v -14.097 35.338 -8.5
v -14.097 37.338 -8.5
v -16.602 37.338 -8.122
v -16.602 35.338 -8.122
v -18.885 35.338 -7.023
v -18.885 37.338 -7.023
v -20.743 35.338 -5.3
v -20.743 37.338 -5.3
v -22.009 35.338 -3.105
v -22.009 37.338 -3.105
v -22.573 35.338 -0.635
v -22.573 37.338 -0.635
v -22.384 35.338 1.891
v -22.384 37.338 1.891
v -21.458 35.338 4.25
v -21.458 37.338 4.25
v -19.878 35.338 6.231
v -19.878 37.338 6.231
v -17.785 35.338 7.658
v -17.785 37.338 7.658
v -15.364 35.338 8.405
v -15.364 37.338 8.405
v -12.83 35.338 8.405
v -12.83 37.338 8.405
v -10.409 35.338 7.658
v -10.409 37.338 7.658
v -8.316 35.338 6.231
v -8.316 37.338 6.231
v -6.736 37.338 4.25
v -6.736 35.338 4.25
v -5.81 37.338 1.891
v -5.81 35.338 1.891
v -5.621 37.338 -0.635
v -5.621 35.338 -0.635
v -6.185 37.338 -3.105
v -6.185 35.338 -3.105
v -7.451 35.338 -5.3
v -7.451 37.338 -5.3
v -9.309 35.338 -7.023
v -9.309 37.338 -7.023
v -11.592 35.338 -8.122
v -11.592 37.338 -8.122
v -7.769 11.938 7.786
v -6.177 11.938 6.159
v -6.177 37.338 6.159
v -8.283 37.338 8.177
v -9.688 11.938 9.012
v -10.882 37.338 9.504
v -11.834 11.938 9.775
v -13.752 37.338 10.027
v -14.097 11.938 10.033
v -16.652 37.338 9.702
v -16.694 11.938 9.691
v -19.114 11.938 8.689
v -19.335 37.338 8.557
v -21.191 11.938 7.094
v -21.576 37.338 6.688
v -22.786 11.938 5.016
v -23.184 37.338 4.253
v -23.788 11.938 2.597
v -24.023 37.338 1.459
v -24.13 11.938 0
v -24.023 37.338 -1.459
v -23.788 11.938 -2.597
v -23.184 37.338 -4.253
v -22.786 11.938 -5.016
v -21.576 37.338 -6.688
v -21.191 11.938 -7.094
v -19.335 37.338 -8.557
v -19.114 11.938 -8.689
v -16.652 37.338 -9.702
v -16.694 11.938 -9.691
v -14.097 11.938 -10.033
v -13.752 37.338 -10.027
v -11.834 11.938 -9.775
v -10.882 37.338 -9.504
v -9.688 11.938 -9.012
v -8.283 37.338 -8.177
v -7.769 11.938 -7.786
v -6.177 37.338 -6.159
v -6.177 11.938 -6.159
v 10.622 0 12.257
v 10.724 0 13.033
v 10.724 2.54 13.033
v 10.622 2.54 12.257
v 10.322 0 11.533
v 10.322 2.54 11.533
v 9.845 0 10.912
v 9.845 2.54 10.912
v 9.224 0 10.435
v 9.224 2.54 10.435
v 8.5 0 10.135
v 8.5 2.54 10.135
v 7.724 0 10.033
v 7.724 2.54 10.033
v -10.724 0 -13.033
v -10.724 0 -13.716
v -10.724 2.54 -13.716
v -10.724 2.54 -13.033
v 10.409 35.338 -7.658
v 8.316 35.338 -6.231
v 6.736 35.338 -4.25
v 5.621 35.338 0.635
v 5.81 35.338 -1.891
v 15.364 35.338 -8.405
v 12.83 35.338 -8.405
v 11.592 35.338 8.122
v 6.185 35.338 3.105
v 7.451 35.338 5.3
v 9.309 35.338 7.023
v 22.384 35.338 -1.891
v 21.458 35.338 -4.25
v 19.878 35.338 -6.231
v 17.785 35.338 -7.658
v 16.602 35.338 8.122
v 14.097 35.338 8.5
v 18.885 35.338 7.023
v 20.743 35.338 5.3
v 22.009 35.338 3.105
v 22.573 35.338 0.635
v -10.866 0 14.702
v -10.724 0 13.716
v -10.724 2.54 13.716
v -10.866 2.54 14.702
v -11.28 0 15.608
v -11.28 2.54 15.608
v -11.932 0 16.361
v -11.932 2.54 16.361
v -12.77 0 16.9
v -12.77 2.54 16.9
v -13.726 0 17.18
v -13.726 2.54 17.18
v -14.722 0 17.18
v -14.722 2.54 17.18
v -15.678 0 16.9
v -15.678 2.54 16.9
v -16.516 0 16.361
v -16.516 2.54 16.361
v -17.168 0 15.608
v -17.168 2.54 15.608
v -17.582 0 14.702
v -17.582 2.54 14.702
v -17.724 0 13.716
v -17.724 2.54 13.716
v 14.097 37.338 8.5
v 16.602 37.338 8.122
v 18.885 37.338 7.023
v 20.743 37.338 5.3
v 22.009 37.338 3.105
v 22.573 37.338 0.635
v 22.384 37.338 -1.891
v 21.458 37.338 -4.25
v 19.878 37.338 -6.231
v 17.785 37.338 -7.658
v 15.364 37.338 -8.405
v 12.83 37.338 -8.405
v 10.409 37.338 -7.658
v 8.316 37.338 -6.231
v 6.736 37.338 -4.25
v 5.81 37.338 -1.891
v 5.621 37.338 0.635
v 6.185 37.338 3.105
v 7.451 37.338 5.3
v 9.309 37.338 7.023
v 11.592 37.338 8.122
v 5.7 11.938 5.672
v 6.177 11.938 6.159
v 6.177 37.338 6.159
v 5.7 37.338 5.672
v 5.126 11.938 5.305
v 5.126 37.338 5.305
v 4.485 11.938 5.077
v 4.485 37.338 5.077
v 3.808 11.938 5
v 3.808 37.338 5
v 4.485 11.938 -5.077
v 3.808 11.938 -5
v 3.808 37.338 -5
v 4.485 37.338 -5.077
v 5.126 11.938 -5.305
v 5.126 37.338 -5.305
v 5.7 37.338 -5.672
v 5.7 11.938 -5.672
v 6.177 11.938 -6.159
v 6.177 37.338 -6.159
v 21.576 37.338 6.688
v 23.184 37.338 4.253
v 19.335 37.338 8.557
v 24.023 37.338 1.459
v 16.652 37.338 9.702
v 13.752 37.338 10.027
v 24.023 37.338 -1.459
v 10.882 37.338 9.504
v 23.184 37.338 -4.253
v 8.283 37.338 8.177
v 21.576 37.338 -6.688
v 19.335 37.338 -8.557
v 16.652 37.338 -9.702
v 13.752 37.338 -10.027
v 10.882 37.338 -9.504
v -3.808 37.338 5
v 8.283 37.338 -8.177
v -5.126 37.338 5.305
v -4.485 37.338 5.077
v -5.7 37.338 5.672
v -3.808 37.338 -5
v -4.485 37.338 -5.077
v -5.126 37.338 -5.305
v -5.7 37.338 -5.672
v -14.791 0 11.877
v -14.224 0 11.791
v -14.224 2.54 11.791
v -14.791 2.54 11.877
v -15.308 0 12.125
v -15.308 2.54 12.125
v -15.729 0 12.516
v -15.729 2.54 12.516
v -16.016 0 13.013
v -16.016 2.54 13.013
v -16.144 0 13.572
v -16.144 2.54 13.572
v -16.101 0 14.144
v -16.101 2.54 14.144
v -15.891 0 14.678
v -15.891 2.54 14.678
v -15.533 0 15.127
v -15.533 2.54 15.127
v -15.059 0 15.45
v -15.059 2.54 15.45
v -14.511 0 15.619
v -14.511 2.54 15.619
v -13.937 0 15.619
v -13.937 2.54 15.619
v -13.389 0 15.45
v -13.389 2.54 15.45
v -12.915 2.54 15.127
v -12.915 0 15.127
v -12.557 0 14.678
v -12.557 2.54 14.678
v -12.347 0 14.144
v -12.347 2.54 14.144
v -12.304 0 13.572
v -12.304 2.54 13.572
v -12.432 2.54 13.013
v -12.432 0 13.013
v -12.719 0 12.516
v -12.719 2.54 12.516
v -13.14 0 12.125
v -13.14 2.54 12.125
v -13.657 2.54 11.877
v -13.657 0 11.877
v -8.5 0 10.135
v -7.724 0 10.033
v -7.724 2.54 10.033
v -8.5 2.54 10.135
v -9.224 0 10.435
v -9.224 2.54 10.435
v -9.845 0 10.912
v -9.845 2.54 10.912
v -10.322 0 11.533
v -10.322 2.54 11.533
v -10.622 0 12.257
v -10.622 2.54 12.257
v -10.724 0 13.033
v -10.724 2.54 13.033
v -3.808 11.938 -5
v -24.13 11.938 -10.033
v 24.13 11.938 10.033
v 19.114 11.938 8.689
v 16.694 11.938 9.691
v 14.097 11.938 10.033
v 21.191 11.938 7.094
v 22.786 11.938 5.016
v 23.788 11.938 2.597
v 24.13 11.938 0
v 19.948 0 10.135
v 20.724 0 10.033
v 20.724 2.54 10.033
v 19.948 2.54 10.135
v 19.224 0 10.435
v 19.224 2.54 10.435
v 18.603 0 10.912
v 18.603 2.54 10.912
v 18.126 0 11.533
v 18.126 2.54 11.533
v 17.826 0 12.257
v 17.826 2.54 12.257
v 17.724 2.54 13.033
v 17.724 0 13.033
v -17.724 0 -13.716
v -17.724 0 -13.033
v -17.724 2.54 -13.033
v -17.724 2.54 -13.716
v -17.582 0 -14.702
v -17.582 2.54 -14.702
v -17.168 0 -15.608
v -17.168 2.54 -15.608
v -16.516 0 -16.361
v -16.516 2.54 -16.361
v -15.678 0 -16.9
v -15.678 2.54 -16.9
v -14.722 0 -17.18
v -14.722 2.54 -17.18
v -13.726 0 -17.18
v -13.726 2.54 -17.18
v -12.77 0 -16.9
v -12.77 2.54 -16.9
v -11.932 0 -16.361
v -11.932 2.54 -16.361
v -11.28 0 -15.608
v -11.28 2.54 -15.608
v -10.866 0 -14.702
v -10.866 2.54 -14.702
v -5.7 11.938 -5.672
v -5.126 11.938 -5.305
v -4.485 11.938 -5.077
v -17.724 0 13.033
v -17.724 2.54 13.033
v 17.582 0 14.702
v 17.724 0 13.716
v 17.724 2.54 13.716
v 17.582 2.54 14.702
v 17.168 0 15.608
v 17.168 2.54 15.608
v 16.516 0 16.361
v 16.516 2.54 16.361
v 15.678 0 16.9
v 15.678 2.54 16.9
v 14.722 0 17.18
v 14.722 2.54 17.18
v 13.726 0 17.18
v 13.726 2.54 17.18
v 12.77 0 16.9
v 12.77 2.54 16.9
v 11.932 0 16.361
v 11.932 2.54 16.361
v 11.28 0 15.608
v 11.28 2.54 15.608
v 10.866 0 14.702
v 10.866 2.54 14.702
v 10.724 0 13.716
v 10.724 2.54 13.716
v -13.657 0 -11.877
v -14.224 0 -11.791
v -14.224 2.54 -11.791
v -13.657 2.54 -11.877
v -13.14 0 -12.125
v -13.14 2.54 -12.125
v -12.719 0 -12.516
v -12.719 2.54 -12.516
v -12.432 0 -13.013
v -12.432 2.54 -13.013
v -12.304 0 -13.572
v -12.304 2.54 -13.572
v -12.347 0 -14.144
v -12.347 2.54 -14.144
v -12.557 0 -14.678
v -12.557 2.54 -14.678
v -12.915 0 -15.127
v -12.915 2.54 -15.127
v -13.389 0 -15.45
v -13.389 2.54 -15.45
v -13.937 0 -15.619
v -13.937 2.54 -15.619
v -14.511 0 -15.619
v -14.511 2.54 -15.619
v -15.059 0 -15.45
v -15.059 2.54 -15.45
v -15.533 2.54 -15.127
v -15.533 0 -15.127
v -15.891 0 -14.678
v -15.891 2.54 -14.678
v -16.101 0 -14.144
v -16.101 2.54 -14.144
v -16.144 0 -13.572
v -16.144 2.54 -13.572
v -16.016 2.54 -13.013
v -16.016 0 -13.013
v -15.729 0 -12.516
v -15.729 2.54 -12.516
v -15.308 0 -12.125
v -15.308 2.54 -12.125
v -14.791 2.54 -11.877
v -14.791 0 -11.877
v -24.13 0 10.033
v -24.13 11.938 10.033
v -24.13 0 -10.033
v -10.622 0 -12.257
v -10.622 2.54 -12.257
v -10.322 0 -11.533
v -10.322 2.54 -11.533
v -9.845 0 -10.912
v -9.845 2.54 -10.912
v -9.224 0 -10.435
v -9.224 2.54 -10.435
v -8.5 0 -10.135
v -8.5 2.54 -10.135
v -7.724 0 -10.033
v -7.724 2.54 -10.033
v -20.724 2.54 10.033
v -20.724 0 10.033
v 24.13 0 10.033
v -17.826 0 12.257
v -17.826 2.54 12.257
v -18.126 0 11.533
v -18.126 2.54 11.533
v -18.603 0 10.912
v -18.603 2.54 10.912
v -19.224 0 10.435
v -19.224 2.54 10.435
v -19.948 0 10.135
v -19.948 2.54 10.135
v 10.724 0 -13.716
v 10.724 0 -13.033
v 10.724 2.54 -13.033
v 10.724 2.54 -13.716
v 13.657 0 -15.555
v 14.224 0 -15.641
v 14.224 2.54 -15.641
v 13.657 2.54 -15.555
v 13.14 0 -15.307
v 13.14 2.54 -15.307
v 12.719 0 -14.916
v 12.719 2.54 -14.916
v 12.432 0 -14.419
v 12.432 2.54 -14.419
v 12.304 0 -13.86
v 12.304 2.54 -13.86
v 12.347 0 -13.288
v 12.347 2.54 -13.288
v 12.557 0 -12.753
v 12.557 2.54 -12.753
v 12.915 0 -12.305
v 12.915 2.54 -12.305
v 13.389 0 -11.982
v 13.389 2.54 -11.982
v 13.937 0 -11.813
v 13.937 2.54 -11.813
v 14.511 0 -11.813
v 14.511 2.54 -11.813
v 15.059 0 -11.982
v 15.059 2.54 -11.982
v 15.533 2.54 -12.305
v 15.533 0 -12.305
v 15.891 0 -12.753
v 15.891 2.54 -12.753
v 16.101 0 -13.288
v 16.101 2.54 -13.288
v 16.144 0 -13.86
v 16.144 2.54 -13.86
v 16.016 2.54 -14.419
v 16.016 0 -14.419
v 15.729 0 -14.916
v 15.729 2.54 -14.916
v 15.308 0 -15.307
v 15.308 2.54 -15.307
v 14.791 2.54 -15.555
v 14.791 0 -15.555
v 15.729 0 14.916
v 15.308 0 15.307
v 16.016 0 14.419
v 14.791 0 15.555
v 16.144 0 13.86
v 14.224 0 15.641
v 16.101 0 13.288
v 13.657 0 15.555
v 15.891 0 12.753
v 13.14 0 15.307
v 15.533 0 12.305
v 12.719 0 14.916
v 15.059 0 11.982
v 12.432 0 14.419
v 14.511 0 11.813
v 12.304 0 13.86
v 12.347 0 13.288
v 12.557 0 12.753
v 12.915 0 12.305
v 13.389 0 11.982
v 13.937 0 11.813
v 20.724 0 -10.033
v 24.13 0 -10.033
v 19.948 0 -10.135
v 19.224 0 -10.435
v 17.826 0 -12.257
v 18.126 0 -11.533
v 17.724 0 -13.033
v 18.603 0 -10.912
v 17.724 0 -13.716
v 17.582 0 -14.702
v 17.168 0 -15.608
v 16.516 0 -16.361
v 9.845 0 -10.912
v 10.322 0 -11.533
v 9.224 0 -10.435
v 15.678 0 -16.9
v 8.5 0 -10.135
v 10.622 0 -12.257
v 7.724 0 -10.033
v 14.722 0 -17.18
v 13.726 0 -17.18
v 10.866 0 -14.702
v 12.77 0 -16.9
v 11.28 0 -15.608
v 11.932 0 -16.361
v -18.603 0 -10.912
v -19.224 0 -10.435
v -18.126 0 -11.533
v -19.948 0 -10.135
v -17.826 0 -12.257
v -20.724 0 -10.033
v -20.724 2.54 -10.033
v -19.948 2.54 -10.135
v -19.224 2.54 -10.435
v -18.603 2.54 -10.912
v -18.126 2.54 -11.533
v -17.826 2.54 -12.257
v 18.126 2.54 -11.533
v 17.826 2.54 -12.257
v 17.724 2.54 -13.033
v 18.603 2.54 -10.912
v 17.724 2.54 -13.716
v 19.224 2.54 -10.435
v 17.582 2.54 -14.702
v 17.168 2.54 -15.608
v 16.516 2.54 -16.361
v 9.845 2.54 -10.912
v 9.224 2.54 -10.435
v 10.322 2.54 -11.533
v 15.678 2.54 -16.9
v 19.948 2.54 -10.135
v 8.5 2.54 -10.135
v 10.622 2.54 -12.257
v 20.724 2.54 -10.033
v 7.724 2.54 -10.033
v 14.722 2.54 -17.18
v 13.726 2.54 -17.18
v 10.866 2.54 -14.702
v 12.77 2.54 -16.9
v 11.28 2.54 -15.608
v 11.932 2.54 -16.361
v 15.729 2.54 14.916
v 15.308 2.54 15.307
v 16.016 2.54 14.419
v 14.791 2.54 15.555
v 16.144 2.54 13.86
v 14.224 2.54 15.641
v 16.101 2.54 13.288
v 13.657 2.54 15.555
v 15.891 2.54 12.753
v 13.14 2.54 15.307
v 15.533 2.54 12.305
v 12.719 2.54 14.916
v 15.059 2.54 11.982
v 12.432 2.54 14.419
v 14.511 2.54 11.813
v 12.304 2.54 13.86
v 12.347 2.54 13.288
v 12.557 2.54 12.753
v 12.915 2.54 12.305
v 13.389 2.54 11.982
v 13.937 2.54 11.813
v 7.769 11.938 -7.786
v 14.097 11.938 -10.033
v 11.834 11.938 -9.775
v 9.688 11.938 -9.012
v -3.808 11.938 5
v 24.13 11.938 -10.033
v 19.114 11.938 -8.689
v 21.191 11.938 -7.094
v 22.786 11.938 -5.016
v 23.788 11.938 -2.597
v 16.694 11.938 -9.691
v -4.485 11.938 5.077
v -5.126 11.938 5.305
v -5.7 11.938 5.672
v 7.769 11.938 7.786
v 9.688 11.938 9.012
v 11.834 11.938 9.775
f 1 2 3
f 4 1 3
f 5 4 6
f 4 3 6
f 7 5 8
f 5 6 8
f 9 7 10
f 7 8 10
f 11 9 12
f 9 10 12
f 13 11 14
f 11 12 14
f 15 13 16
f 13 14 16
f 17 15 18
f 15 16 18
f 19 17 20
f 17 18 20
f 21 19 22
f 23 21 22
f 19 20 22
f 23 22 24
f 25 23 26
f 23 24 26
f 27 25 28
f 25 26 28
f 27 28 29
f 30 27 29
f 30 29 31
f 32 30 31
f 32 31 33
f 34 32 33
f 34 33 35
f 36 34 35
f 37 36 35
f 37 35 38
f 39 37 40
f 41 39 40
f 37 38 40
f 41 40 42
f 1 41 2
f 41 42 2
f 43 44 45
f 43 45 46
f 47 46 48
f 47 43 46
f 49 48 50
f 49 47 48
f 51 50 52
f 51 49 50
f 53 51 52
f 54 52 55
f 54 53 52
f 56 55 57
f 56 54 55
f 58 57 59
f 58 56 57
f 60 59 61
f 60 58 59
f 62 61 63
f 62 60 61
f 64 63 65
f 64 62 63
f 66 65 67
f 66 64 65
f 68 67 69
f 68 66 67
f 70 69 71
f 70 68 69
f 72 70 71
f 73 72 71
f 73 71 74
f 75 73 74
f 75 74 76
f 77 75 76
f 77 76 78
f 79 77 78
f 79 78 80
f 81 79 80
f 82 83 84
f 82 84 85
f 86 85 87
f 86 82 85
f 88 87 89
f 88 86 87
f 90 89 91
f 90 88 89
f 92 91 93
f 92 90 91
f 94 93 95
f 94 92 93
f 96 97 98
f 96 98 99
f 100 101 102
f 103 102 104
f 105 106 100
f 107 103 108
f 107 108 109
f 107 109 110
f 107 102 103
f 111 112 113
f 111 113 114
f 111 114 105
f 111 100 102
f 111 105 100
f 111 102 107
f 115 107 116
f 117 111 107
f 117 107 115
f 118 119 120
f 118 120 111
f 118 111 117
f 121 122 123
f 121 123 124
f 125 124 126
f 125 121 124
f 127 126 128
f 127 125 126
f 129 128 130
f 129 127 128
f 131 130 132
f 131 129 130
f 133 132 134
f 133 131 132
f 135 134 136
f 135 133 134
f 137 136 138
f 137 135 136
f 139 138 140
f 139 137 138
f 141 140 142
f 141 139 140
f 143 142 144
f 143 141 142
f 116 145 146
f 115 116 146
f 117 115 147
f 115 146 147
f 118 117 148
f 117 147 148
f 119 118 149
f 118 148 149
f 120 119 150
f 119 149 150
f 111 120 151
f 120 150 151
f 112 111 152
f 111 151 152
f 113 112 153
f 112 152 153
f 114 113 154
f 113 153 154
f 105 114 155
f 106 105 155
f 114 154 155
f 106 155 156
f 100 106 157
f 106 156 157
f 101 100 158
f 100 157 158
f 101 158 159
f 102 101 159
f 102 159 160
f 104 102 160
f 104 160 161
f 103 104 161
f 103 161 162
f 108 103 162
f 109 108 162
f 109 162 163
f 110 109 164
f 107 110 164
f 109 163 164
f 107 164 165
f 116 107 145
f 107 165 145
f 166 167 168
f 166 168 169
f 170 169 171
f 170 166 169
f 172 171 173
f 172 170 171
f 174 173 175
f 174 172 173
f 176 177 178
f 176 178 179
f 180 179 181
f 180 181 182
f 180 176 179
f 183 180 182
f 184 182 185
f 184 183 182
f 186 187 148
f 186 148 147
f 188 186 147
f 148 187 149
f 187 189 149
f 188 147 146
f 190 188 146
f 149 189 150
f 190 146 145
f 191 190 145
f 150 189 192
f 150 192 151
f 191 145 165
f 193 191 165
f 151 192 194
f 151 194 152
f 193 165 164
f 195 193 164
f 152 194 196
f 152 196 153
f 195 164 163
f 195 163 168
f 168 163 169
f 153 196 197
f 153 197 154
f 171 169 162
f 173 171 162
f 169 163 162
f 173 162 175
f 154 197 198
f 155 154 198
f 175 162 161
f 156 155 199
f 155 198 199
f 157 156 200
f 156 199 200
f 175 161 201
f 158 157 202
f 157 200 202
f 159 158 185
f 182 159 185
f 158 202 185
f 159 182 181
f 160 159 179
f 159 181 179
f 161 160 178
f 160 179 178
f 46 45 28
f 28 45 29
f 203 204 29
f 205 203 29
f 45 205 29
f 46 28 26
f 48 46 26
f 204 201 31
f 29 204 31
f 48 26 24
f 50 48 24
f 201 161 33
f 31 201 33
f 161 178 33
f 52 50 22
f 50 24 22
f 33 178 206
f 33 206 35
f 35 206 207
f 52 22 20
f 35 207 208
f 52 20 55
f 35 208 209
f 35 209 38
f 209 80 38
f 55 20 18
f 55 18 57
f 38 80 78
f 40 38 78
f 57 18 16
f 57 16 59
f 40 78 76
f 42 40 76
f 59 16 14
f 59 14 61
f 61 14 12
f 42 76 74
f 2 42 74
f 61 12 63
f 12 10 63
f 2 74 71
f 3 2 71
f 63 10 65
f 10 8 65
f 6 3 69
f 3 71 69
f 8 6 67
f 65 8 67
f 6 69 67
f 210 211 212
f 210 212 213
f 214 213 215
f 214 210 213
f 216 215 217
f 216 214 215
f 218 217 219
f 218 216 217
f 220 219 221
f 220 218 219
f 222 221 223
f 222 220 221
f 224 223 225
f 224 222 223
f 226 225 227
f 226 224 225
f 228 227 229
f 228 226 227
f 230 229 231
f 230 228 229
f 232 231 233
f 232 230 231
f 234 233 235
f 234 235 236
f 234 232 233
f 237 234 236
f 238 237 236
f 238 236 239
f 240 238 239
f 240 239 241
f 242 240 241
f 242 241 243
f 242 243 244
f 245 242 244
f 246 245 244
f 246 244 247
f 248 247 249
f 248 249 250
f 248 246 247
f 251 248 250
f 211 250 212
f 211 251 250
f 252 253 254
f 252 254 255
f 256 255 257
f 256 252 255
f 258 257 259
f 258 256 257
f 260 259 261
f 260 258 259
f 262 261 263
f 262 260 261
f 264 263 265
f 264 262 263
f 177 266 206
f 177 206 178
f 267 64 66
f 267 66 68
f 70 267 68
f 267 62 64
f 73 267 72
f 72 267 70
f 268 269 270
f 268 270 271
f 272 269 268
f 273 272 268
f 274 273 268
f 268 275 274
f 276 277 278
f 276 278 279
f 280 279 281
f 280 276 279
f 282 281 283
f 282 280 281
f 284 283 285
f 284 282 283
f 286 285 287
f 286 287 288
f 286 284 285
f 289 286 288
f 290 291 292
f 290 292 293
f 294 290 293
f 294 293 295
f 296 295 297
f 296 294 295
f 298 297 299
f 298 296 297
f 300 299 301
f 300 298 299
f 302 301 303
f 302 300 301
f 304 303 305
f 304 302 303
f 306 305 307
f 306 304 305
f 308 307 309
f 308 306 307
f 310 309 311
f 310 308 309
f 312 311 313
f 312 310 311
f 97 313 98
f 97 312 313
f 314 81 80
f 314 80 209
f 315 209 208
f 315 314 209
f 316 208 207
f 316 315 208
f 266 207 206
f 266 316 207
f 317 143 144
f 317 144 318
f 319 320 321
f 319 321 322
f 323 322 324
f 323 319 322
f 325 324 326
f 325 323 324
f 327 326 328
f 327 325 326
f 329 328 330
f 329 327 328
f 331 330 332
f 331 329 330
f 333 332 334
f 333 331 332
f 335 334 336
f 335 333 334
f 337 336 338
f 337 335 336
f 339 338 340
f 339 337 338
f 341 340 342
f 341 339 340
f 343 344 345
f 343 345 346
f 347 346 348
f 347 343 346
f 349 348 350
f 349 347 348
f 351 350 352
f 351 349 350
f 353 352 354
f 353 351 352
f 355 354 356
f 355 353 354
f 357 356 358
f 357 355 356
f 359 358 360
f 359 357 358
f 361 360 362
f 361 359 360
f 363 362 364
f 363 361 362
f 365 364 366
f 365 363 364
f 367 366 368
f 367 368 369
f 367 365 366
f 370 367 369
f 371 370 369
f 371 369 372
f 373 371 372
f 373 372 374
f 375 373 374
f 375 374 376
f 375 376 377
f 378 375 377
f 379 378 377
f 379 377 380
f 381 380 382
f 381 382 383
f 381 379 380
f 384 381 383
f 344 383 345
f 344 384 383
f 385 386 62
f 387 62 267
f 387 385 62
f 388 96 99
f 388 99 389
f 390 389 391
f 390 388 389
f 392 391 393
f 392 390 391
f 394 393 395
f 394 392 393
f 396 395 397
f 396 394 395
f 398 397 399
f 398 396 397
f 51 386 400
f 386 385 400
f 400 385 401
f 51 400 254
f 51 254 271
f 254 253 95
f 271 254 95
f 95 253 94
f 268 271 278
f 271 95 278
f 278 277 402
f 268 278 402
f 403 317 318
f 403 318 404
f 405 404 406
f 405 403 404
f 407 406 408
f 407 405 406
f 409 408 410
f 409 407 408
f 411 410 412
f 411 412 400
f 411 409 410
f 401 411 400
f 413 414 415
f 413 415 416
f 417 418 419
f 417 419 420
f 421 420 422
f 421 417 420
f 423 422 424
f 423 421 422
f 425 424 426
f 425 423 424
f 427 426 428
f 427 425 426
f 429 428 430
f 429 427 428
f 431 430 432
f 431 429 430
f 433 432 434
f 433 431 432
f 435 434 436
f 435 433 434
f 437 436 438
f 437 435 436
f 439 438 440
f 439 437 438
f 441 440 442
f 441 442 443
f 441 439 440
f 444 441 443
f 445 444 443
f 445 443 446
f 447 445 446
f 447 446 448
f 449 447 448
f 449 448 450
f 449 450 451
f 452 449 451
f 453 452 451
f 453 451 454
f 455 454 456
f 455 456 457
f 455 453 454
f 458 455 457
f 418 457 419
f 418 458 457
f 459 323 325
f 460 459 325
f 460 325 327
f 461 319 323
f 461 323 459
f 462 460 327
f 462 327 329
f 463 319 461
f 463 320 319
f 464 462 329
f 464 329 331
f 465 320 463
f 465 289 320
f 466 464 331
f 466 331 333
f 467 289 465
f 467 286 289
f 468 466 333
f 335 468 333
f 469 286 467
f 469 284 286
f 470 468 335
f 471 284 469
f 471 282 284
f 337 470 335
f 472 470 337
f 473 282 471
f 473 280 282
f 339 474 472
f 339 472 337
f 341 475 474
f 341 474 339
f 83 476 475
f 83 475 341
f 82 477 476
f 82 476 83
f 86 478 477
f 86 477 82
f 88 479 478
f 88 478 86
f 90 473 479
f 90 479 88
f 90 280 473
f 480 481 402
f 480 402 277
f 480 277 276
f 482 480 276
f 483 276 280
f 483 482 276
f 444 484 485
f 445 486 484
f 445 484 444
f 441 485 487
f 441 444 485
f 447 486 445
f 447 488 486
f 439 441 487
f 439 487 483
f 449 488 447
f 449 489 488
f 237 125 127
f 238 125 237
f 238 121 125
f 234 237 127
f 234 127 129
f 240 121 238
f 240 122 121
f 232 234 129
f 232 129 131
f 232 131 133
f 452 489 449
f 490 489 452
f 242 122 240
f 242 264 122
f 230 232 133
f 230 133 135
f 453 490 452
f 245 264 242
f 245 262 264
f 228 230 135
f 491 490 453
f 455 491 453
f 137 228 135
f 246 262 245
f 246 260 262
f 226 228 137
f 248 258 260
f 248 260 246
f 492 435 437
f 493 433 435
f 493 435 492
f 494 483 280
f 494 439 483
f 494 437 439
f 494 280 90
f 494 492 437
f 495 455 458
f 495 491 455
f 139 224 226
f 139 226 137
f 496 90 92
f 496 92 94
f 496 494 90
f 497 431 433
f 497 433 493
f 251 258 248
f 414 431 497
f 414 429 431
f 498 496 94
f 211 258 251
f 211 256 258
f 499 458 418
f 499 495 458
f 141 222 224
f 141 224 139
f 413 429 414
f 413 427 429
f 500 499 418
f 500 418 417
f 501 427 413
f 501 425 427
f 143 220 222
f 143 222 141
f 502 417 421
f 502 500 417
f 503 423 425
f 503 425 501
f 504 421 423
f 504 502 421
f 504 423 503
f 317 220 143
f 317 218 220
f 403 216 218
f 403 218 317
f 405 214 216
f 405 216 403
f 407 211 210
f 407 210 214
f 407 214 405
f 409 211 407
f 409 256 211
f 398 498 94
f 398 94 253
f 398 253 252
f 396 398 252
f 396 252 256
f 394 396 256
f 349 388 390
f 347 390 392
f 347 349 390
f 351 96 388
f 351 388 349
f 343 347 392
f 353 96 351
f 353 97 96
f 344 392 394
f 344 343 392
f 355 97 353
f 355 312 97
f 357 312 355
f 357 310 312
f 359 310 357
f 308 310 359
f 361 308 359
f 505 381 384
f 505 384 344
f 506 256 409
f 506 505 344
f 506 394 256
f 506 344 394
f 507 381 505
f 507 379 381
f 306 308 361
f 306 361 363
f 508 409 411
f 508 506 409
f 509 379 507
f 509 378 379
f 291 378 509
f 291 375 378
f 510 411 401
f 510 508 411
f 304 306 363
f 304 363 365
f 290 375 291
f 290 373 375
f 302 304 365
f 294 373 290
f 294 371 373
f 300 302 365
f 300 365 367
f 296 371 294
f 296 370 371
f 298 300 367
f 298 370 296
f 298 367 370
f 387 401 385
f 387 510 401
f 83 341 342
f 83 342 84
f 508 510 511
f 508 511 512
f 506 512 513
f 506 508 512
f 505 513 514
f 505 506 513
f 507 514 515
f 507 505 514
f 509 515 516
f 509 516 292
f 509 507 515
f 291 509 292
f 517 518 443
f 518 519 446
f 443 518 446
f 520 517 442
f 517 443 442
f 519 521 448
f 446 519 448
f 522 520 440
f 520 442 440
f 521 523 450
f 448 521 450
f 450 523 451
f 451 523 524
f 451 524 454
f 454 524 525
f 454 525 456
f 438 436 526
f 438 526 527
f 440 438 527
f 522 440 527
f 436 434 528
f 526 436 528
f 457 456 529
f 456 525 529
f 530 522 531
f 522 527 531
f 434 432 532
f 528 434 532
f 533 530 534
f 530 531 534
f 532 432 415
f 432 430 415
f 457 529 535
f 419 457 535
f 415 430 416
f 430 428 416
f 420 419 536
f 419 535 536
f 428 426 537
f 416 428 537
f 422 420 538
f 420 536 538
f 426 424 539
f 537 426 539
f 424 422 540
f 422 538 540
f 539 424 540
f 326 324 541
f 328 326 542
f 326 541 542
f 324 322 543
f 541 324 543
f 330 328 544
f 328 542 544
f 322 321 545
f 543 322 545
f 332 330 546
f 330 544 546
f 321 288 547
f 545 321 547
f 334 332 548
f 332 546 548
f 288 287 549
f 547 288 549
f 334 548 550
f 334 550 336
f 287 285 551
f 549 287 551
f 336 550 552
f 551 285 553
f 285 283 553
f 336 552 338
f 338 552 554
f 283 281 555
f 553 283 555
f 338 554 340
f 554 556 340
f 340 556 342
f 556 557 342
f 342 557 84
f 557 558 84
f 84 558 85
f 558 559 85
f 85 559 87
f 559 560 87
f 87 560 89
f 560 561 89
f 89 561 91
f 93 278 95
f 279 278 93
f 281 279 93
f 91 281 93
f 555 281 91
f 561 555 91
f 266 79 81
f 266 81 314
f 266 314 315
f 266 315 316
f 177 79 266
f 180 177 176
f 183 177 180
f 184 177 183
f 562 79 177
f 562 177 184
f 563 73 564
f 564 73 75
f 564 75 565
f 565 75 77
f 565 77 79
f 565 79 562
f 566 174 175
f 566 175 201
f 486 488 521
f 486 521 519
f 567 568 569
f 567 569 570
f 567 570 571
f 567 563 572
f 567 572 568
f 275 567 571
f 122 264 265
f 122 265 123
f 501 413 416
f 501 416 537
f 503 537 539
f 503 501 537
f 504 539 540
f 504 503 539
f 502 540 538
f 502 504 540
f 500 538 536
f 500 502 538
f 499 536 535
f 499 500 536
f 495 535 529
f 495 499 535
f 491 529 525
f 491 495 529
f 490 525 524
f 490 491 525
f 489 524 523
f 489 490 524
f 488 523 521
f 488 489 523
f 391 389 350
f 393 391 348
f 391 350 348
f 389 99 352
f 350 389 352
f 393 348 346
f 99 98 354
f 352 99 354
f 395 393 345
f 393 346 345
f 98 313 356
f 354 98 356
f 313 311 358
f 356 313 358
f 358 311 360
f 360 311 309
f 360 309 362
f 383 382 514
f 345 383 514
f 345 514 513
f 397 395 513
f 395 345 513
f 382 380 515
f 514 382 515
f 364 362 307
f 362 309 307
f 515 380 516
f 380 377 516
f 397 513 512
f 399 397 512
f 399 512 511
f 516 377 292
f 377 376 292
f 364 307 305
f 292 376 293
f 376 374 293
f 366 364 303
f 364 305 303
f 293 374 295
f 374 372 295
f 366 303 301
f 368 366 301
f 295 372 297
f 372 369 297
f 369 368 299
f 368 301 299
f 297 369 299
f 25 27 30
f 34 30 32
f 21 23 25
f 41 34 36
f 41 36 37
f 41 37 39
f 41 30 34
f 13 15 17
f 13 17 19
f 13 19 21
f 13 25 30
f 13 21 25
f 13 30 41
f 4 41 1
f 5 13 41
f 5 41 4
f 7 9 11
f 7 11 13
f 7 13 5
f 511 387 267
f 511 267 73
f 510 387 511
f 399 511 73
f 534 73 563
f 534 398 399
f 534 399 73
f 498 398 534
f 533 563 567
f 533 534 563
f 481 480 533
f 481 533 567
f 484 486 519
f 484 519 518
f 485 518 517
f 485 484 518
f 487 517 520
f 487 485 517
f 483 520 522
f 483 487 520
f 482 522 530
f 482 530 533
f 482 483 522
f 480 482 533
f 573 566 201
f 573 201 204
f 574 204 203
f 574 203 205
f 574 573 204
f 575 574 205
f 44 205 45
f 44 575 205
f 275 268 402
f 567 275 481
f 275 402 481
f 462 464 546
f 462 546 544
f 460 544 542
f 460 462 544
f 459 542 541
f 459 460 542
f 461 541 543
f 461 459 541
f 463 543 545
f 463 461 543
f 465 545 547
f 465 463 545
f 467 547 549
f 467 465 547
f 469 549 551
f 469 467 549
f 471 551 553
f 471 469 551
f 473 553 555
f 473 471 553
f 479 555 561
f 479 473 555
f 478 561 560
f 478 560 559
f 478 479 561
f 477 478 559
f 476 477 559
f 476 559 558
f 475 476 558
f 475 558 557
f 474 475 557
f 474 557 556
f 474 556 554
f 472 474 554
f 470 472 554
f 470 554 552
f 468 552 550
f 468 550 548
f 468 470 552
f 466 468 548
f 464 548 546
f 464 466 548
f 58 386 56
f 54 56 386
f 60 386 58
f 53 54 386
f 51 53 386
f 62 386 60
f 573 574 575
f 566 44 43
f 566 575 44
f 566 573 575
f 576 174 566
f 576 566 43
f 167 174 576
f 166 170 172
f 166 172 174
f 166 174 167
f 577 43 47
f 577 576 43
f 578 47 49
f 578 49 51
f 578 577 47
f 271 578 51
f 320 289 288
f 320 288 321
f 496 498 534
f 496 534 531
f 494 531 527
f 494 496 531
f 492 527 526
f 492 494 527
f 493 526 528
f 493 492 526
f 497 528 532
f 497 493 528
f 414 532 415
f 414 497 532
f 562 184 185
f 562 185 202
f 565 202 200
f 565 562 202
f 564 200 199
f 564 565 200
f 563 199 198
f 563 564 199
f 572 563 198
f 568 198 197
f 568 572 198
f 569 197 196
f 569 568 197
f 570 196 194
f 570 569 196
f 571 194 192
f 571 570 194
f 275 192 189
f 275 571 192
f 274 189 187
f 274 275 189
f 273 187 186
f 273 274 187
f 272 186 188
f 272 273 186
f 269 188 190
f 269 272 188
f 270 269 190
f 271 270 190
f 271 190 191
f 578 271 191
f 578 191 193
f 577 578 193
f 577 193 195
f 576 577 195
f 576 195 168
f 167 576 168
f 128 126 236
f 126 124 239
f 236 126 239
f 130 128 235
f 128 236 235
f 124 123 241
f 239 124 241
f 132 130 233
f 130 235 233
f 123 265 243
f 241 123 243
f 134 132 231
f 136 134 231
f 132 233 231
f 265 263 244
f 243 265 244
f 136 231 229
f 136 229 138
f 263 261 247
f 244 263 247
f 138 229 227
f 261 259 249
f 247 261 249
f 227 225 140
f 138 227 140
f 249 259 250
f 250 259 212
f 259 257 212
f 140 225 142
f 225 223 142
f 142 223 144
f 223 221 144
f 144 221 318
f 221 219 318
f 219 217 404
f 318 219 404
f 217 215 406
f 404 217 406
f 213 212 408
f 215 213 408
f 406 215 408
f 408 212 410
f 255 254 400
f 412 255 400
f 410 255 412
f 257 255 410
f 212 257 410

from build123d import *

# Parameters (mm, degrees)
SKETCH1_R           = 1.925
BOSS_EXTRUDE1_DEPTH = 2.54
SKETCH2_W           = 48.26
SKETCH2_H           = 20.066
BOSS_EXTRUDE2_DEPTH = 9.398
BOSS_EXTRUDE3_DEPTH = 25.4
SKETCH4_R           = 8.5
CUT_EXTRUDE1_DEPTH  = 2


with BuildPart() as part:
    # Sketch1 → Boss-Extrude1 (new body)
    with BuildSketch(Plane(origin=(0, 0, 0), x_dir=(1, 0, 0), z_dir=(0, 1, 0))):
        with BuildLine():
            Line((-24.13, 10.033), (-20.724, 10.033))
            ThreePointArc((-20.724, 10.033), (-18.602679656, 10.911679656), (-17.724, 13.033))
            Line((-17.724, 13.033), (-17.724, 13.716))
            ThreePointArc((-17.724, 13.716), (-14.224, 17.216), (-10.724, 13.716))
            Line((-10.724, 13.716), (-10.724, 13.033))
            ThreePointArc((-10.724, 13.033), (-9.845320344, 10.911679656), (-7.724, 10.033))
            Line((-7.724, 10.033), (7.724, 10.033))
            ThreePointArc((7.724, 10.033), (9.845320344, 10.911679656), (10.724, 13.033))
            Line((10.724, 13.033), (10.724, 13.716))
            ThreePointArc((10.724, 13.716), (14.224, 17.216), (17.724, 13.716))
            Line((17.724, 13.716), (17.724, 13.033))
            ThreePointArc((17.724, 13.033), (18.602679656, 10.911679656), (20.724, 10.033))
            Line((20.724, 10.033), (24.13, 10.033))
            Line((24.13, 10.033), (24.13, -10.033))
            Line((24.13, -10.033), (20.724, -10.033))
            ThreePointArc((20.724, -10.033), (18.602679656, -10.911679656), (17.724, -13.033))
            Line((17.724, -13.033), (17.724, -13.716))
            ThreePointArc((17.724, -13.716), (14.224, -17.216), (10.724, -13.716))
            Line((10.724, -13.716), (10.724, -13.033))
            ThreePointArc((10.724, -13.033), (9.845320344, -10.911679656), (7.724, -10.033))
            Line((7.724, -10.033), (-7.724, -10.033))
            ThreePointArc((-7.724, -10.033), (-9.845320344, -10.911679656), (-10.724, -13.033))
            Line((-10.724, -13.033), (-10.724, -13.716))
            ThreePointArc((-10.724, -13.716), (-14.224, -17.216), (-17.724, -13.716))
            Line((-17.724, -13.716), (-17.724, -13.033))
            ThreePointArc((-17.724, -13.033), (-18.602679656, -10.911679656), (-20.724, -10.033))
            Line((-20.724, -10.033), (-24.13, -10.033))
            Line((-24.13, -10.033), (-24.13, 10.033))
        make_face()
        with Locations(Location((-14.224, 13.716, 0), (0, 0, 270))):
            Circle(SKETCH1_R, mode=Mode.SUBTRACT)
        with Locations(Location((-14.224, -13.716, 0), (0, 0, 90))):
            Circle(SKETCH1_R, mode=Mode.SUBTRACT)
        with Locations(Location((14.224, -13.716, 0), (0, 0, 270))):
            Circle(SKETCH1_R, mode=Mode.SUBTRACT)
        with Locations(Location((14.224, 13.716, 0), (0, 0, 90))):
            Circle(SKETCH1_R, mode=Mode.SUBTRACT)
    extrude(amount=BOSS_EXTRUDE1_DEPTH)

    # Sketch2 → Boss-Extrude2 (add)
    with BuildSketch(Plane(origin=(0, 2.54, 0), x_dir=(1, 0, 0), z_dir=(0, 1, 0))):
        Rectangle(SKETCH2_W, SKETCH2_H)
    extrude(amount=BOSS_EXTRUDE2_DEPTH)

    # Sketch3 → Boss-Extrude3 (add)
    with BuildSketch(Plane(origin=(0, 11.938, 0), x_dir=(1, 0, 0), z_dir=(0, 1, 0))):
        with BuildLine():
            Line((-3.808215378, 5), (3.808215378, 5))
            ThreePointArc((3.808215378, 5), (5.126464602, 5.305149544), (6.176538394, 6.158520678))
            ThreePointArc((6.176538394, 6.158520678), (24.13, 0), (6.176538394, -6.158520678))
            ThreePointArc((6.176538394, -6.158520678), (5.126464602, -5.305149544), (3.808215378, -5))
            Line((3.808215378, -5), (-3.808215378, -5))
            ThreePointArc((-3.808215378, -5), (-5.126464602, -5.305149544), (-6.176538394, -6.158520678))
            ThreePointArc((-6.176538394, -6.158520678), (-24.13, 0), (-6.176538394, 6.158520678))
            ThreePointArc((-6.176538394, 6.158520678), (-5.126464602, 5.305149544), (-3.808215378, 5))
        make_face()
    extrude(amount=BOSS_EXTRUDE3_DEPTH)

    # Sketch4 → Cut-Extrude1 (cut)
    with BuildSketch(Plane(origin=(0, 37.338, 0), x_dir=(1, 0, 0), z_dir=(0, 1, 0))):
        with Locations(Location((14.097, 0, 0), (0, 0, 270))):
            Circle(SKETCH4_R)
        with Locations(Location((-14.097, 0, 0), (0, 0, 90))):
            Circle(SKETCH4_R)
    extrude(amount=-CUT_EXTRUDE1_DEPTH, mode=Mode.SUBTRACT)


solid = part.part
